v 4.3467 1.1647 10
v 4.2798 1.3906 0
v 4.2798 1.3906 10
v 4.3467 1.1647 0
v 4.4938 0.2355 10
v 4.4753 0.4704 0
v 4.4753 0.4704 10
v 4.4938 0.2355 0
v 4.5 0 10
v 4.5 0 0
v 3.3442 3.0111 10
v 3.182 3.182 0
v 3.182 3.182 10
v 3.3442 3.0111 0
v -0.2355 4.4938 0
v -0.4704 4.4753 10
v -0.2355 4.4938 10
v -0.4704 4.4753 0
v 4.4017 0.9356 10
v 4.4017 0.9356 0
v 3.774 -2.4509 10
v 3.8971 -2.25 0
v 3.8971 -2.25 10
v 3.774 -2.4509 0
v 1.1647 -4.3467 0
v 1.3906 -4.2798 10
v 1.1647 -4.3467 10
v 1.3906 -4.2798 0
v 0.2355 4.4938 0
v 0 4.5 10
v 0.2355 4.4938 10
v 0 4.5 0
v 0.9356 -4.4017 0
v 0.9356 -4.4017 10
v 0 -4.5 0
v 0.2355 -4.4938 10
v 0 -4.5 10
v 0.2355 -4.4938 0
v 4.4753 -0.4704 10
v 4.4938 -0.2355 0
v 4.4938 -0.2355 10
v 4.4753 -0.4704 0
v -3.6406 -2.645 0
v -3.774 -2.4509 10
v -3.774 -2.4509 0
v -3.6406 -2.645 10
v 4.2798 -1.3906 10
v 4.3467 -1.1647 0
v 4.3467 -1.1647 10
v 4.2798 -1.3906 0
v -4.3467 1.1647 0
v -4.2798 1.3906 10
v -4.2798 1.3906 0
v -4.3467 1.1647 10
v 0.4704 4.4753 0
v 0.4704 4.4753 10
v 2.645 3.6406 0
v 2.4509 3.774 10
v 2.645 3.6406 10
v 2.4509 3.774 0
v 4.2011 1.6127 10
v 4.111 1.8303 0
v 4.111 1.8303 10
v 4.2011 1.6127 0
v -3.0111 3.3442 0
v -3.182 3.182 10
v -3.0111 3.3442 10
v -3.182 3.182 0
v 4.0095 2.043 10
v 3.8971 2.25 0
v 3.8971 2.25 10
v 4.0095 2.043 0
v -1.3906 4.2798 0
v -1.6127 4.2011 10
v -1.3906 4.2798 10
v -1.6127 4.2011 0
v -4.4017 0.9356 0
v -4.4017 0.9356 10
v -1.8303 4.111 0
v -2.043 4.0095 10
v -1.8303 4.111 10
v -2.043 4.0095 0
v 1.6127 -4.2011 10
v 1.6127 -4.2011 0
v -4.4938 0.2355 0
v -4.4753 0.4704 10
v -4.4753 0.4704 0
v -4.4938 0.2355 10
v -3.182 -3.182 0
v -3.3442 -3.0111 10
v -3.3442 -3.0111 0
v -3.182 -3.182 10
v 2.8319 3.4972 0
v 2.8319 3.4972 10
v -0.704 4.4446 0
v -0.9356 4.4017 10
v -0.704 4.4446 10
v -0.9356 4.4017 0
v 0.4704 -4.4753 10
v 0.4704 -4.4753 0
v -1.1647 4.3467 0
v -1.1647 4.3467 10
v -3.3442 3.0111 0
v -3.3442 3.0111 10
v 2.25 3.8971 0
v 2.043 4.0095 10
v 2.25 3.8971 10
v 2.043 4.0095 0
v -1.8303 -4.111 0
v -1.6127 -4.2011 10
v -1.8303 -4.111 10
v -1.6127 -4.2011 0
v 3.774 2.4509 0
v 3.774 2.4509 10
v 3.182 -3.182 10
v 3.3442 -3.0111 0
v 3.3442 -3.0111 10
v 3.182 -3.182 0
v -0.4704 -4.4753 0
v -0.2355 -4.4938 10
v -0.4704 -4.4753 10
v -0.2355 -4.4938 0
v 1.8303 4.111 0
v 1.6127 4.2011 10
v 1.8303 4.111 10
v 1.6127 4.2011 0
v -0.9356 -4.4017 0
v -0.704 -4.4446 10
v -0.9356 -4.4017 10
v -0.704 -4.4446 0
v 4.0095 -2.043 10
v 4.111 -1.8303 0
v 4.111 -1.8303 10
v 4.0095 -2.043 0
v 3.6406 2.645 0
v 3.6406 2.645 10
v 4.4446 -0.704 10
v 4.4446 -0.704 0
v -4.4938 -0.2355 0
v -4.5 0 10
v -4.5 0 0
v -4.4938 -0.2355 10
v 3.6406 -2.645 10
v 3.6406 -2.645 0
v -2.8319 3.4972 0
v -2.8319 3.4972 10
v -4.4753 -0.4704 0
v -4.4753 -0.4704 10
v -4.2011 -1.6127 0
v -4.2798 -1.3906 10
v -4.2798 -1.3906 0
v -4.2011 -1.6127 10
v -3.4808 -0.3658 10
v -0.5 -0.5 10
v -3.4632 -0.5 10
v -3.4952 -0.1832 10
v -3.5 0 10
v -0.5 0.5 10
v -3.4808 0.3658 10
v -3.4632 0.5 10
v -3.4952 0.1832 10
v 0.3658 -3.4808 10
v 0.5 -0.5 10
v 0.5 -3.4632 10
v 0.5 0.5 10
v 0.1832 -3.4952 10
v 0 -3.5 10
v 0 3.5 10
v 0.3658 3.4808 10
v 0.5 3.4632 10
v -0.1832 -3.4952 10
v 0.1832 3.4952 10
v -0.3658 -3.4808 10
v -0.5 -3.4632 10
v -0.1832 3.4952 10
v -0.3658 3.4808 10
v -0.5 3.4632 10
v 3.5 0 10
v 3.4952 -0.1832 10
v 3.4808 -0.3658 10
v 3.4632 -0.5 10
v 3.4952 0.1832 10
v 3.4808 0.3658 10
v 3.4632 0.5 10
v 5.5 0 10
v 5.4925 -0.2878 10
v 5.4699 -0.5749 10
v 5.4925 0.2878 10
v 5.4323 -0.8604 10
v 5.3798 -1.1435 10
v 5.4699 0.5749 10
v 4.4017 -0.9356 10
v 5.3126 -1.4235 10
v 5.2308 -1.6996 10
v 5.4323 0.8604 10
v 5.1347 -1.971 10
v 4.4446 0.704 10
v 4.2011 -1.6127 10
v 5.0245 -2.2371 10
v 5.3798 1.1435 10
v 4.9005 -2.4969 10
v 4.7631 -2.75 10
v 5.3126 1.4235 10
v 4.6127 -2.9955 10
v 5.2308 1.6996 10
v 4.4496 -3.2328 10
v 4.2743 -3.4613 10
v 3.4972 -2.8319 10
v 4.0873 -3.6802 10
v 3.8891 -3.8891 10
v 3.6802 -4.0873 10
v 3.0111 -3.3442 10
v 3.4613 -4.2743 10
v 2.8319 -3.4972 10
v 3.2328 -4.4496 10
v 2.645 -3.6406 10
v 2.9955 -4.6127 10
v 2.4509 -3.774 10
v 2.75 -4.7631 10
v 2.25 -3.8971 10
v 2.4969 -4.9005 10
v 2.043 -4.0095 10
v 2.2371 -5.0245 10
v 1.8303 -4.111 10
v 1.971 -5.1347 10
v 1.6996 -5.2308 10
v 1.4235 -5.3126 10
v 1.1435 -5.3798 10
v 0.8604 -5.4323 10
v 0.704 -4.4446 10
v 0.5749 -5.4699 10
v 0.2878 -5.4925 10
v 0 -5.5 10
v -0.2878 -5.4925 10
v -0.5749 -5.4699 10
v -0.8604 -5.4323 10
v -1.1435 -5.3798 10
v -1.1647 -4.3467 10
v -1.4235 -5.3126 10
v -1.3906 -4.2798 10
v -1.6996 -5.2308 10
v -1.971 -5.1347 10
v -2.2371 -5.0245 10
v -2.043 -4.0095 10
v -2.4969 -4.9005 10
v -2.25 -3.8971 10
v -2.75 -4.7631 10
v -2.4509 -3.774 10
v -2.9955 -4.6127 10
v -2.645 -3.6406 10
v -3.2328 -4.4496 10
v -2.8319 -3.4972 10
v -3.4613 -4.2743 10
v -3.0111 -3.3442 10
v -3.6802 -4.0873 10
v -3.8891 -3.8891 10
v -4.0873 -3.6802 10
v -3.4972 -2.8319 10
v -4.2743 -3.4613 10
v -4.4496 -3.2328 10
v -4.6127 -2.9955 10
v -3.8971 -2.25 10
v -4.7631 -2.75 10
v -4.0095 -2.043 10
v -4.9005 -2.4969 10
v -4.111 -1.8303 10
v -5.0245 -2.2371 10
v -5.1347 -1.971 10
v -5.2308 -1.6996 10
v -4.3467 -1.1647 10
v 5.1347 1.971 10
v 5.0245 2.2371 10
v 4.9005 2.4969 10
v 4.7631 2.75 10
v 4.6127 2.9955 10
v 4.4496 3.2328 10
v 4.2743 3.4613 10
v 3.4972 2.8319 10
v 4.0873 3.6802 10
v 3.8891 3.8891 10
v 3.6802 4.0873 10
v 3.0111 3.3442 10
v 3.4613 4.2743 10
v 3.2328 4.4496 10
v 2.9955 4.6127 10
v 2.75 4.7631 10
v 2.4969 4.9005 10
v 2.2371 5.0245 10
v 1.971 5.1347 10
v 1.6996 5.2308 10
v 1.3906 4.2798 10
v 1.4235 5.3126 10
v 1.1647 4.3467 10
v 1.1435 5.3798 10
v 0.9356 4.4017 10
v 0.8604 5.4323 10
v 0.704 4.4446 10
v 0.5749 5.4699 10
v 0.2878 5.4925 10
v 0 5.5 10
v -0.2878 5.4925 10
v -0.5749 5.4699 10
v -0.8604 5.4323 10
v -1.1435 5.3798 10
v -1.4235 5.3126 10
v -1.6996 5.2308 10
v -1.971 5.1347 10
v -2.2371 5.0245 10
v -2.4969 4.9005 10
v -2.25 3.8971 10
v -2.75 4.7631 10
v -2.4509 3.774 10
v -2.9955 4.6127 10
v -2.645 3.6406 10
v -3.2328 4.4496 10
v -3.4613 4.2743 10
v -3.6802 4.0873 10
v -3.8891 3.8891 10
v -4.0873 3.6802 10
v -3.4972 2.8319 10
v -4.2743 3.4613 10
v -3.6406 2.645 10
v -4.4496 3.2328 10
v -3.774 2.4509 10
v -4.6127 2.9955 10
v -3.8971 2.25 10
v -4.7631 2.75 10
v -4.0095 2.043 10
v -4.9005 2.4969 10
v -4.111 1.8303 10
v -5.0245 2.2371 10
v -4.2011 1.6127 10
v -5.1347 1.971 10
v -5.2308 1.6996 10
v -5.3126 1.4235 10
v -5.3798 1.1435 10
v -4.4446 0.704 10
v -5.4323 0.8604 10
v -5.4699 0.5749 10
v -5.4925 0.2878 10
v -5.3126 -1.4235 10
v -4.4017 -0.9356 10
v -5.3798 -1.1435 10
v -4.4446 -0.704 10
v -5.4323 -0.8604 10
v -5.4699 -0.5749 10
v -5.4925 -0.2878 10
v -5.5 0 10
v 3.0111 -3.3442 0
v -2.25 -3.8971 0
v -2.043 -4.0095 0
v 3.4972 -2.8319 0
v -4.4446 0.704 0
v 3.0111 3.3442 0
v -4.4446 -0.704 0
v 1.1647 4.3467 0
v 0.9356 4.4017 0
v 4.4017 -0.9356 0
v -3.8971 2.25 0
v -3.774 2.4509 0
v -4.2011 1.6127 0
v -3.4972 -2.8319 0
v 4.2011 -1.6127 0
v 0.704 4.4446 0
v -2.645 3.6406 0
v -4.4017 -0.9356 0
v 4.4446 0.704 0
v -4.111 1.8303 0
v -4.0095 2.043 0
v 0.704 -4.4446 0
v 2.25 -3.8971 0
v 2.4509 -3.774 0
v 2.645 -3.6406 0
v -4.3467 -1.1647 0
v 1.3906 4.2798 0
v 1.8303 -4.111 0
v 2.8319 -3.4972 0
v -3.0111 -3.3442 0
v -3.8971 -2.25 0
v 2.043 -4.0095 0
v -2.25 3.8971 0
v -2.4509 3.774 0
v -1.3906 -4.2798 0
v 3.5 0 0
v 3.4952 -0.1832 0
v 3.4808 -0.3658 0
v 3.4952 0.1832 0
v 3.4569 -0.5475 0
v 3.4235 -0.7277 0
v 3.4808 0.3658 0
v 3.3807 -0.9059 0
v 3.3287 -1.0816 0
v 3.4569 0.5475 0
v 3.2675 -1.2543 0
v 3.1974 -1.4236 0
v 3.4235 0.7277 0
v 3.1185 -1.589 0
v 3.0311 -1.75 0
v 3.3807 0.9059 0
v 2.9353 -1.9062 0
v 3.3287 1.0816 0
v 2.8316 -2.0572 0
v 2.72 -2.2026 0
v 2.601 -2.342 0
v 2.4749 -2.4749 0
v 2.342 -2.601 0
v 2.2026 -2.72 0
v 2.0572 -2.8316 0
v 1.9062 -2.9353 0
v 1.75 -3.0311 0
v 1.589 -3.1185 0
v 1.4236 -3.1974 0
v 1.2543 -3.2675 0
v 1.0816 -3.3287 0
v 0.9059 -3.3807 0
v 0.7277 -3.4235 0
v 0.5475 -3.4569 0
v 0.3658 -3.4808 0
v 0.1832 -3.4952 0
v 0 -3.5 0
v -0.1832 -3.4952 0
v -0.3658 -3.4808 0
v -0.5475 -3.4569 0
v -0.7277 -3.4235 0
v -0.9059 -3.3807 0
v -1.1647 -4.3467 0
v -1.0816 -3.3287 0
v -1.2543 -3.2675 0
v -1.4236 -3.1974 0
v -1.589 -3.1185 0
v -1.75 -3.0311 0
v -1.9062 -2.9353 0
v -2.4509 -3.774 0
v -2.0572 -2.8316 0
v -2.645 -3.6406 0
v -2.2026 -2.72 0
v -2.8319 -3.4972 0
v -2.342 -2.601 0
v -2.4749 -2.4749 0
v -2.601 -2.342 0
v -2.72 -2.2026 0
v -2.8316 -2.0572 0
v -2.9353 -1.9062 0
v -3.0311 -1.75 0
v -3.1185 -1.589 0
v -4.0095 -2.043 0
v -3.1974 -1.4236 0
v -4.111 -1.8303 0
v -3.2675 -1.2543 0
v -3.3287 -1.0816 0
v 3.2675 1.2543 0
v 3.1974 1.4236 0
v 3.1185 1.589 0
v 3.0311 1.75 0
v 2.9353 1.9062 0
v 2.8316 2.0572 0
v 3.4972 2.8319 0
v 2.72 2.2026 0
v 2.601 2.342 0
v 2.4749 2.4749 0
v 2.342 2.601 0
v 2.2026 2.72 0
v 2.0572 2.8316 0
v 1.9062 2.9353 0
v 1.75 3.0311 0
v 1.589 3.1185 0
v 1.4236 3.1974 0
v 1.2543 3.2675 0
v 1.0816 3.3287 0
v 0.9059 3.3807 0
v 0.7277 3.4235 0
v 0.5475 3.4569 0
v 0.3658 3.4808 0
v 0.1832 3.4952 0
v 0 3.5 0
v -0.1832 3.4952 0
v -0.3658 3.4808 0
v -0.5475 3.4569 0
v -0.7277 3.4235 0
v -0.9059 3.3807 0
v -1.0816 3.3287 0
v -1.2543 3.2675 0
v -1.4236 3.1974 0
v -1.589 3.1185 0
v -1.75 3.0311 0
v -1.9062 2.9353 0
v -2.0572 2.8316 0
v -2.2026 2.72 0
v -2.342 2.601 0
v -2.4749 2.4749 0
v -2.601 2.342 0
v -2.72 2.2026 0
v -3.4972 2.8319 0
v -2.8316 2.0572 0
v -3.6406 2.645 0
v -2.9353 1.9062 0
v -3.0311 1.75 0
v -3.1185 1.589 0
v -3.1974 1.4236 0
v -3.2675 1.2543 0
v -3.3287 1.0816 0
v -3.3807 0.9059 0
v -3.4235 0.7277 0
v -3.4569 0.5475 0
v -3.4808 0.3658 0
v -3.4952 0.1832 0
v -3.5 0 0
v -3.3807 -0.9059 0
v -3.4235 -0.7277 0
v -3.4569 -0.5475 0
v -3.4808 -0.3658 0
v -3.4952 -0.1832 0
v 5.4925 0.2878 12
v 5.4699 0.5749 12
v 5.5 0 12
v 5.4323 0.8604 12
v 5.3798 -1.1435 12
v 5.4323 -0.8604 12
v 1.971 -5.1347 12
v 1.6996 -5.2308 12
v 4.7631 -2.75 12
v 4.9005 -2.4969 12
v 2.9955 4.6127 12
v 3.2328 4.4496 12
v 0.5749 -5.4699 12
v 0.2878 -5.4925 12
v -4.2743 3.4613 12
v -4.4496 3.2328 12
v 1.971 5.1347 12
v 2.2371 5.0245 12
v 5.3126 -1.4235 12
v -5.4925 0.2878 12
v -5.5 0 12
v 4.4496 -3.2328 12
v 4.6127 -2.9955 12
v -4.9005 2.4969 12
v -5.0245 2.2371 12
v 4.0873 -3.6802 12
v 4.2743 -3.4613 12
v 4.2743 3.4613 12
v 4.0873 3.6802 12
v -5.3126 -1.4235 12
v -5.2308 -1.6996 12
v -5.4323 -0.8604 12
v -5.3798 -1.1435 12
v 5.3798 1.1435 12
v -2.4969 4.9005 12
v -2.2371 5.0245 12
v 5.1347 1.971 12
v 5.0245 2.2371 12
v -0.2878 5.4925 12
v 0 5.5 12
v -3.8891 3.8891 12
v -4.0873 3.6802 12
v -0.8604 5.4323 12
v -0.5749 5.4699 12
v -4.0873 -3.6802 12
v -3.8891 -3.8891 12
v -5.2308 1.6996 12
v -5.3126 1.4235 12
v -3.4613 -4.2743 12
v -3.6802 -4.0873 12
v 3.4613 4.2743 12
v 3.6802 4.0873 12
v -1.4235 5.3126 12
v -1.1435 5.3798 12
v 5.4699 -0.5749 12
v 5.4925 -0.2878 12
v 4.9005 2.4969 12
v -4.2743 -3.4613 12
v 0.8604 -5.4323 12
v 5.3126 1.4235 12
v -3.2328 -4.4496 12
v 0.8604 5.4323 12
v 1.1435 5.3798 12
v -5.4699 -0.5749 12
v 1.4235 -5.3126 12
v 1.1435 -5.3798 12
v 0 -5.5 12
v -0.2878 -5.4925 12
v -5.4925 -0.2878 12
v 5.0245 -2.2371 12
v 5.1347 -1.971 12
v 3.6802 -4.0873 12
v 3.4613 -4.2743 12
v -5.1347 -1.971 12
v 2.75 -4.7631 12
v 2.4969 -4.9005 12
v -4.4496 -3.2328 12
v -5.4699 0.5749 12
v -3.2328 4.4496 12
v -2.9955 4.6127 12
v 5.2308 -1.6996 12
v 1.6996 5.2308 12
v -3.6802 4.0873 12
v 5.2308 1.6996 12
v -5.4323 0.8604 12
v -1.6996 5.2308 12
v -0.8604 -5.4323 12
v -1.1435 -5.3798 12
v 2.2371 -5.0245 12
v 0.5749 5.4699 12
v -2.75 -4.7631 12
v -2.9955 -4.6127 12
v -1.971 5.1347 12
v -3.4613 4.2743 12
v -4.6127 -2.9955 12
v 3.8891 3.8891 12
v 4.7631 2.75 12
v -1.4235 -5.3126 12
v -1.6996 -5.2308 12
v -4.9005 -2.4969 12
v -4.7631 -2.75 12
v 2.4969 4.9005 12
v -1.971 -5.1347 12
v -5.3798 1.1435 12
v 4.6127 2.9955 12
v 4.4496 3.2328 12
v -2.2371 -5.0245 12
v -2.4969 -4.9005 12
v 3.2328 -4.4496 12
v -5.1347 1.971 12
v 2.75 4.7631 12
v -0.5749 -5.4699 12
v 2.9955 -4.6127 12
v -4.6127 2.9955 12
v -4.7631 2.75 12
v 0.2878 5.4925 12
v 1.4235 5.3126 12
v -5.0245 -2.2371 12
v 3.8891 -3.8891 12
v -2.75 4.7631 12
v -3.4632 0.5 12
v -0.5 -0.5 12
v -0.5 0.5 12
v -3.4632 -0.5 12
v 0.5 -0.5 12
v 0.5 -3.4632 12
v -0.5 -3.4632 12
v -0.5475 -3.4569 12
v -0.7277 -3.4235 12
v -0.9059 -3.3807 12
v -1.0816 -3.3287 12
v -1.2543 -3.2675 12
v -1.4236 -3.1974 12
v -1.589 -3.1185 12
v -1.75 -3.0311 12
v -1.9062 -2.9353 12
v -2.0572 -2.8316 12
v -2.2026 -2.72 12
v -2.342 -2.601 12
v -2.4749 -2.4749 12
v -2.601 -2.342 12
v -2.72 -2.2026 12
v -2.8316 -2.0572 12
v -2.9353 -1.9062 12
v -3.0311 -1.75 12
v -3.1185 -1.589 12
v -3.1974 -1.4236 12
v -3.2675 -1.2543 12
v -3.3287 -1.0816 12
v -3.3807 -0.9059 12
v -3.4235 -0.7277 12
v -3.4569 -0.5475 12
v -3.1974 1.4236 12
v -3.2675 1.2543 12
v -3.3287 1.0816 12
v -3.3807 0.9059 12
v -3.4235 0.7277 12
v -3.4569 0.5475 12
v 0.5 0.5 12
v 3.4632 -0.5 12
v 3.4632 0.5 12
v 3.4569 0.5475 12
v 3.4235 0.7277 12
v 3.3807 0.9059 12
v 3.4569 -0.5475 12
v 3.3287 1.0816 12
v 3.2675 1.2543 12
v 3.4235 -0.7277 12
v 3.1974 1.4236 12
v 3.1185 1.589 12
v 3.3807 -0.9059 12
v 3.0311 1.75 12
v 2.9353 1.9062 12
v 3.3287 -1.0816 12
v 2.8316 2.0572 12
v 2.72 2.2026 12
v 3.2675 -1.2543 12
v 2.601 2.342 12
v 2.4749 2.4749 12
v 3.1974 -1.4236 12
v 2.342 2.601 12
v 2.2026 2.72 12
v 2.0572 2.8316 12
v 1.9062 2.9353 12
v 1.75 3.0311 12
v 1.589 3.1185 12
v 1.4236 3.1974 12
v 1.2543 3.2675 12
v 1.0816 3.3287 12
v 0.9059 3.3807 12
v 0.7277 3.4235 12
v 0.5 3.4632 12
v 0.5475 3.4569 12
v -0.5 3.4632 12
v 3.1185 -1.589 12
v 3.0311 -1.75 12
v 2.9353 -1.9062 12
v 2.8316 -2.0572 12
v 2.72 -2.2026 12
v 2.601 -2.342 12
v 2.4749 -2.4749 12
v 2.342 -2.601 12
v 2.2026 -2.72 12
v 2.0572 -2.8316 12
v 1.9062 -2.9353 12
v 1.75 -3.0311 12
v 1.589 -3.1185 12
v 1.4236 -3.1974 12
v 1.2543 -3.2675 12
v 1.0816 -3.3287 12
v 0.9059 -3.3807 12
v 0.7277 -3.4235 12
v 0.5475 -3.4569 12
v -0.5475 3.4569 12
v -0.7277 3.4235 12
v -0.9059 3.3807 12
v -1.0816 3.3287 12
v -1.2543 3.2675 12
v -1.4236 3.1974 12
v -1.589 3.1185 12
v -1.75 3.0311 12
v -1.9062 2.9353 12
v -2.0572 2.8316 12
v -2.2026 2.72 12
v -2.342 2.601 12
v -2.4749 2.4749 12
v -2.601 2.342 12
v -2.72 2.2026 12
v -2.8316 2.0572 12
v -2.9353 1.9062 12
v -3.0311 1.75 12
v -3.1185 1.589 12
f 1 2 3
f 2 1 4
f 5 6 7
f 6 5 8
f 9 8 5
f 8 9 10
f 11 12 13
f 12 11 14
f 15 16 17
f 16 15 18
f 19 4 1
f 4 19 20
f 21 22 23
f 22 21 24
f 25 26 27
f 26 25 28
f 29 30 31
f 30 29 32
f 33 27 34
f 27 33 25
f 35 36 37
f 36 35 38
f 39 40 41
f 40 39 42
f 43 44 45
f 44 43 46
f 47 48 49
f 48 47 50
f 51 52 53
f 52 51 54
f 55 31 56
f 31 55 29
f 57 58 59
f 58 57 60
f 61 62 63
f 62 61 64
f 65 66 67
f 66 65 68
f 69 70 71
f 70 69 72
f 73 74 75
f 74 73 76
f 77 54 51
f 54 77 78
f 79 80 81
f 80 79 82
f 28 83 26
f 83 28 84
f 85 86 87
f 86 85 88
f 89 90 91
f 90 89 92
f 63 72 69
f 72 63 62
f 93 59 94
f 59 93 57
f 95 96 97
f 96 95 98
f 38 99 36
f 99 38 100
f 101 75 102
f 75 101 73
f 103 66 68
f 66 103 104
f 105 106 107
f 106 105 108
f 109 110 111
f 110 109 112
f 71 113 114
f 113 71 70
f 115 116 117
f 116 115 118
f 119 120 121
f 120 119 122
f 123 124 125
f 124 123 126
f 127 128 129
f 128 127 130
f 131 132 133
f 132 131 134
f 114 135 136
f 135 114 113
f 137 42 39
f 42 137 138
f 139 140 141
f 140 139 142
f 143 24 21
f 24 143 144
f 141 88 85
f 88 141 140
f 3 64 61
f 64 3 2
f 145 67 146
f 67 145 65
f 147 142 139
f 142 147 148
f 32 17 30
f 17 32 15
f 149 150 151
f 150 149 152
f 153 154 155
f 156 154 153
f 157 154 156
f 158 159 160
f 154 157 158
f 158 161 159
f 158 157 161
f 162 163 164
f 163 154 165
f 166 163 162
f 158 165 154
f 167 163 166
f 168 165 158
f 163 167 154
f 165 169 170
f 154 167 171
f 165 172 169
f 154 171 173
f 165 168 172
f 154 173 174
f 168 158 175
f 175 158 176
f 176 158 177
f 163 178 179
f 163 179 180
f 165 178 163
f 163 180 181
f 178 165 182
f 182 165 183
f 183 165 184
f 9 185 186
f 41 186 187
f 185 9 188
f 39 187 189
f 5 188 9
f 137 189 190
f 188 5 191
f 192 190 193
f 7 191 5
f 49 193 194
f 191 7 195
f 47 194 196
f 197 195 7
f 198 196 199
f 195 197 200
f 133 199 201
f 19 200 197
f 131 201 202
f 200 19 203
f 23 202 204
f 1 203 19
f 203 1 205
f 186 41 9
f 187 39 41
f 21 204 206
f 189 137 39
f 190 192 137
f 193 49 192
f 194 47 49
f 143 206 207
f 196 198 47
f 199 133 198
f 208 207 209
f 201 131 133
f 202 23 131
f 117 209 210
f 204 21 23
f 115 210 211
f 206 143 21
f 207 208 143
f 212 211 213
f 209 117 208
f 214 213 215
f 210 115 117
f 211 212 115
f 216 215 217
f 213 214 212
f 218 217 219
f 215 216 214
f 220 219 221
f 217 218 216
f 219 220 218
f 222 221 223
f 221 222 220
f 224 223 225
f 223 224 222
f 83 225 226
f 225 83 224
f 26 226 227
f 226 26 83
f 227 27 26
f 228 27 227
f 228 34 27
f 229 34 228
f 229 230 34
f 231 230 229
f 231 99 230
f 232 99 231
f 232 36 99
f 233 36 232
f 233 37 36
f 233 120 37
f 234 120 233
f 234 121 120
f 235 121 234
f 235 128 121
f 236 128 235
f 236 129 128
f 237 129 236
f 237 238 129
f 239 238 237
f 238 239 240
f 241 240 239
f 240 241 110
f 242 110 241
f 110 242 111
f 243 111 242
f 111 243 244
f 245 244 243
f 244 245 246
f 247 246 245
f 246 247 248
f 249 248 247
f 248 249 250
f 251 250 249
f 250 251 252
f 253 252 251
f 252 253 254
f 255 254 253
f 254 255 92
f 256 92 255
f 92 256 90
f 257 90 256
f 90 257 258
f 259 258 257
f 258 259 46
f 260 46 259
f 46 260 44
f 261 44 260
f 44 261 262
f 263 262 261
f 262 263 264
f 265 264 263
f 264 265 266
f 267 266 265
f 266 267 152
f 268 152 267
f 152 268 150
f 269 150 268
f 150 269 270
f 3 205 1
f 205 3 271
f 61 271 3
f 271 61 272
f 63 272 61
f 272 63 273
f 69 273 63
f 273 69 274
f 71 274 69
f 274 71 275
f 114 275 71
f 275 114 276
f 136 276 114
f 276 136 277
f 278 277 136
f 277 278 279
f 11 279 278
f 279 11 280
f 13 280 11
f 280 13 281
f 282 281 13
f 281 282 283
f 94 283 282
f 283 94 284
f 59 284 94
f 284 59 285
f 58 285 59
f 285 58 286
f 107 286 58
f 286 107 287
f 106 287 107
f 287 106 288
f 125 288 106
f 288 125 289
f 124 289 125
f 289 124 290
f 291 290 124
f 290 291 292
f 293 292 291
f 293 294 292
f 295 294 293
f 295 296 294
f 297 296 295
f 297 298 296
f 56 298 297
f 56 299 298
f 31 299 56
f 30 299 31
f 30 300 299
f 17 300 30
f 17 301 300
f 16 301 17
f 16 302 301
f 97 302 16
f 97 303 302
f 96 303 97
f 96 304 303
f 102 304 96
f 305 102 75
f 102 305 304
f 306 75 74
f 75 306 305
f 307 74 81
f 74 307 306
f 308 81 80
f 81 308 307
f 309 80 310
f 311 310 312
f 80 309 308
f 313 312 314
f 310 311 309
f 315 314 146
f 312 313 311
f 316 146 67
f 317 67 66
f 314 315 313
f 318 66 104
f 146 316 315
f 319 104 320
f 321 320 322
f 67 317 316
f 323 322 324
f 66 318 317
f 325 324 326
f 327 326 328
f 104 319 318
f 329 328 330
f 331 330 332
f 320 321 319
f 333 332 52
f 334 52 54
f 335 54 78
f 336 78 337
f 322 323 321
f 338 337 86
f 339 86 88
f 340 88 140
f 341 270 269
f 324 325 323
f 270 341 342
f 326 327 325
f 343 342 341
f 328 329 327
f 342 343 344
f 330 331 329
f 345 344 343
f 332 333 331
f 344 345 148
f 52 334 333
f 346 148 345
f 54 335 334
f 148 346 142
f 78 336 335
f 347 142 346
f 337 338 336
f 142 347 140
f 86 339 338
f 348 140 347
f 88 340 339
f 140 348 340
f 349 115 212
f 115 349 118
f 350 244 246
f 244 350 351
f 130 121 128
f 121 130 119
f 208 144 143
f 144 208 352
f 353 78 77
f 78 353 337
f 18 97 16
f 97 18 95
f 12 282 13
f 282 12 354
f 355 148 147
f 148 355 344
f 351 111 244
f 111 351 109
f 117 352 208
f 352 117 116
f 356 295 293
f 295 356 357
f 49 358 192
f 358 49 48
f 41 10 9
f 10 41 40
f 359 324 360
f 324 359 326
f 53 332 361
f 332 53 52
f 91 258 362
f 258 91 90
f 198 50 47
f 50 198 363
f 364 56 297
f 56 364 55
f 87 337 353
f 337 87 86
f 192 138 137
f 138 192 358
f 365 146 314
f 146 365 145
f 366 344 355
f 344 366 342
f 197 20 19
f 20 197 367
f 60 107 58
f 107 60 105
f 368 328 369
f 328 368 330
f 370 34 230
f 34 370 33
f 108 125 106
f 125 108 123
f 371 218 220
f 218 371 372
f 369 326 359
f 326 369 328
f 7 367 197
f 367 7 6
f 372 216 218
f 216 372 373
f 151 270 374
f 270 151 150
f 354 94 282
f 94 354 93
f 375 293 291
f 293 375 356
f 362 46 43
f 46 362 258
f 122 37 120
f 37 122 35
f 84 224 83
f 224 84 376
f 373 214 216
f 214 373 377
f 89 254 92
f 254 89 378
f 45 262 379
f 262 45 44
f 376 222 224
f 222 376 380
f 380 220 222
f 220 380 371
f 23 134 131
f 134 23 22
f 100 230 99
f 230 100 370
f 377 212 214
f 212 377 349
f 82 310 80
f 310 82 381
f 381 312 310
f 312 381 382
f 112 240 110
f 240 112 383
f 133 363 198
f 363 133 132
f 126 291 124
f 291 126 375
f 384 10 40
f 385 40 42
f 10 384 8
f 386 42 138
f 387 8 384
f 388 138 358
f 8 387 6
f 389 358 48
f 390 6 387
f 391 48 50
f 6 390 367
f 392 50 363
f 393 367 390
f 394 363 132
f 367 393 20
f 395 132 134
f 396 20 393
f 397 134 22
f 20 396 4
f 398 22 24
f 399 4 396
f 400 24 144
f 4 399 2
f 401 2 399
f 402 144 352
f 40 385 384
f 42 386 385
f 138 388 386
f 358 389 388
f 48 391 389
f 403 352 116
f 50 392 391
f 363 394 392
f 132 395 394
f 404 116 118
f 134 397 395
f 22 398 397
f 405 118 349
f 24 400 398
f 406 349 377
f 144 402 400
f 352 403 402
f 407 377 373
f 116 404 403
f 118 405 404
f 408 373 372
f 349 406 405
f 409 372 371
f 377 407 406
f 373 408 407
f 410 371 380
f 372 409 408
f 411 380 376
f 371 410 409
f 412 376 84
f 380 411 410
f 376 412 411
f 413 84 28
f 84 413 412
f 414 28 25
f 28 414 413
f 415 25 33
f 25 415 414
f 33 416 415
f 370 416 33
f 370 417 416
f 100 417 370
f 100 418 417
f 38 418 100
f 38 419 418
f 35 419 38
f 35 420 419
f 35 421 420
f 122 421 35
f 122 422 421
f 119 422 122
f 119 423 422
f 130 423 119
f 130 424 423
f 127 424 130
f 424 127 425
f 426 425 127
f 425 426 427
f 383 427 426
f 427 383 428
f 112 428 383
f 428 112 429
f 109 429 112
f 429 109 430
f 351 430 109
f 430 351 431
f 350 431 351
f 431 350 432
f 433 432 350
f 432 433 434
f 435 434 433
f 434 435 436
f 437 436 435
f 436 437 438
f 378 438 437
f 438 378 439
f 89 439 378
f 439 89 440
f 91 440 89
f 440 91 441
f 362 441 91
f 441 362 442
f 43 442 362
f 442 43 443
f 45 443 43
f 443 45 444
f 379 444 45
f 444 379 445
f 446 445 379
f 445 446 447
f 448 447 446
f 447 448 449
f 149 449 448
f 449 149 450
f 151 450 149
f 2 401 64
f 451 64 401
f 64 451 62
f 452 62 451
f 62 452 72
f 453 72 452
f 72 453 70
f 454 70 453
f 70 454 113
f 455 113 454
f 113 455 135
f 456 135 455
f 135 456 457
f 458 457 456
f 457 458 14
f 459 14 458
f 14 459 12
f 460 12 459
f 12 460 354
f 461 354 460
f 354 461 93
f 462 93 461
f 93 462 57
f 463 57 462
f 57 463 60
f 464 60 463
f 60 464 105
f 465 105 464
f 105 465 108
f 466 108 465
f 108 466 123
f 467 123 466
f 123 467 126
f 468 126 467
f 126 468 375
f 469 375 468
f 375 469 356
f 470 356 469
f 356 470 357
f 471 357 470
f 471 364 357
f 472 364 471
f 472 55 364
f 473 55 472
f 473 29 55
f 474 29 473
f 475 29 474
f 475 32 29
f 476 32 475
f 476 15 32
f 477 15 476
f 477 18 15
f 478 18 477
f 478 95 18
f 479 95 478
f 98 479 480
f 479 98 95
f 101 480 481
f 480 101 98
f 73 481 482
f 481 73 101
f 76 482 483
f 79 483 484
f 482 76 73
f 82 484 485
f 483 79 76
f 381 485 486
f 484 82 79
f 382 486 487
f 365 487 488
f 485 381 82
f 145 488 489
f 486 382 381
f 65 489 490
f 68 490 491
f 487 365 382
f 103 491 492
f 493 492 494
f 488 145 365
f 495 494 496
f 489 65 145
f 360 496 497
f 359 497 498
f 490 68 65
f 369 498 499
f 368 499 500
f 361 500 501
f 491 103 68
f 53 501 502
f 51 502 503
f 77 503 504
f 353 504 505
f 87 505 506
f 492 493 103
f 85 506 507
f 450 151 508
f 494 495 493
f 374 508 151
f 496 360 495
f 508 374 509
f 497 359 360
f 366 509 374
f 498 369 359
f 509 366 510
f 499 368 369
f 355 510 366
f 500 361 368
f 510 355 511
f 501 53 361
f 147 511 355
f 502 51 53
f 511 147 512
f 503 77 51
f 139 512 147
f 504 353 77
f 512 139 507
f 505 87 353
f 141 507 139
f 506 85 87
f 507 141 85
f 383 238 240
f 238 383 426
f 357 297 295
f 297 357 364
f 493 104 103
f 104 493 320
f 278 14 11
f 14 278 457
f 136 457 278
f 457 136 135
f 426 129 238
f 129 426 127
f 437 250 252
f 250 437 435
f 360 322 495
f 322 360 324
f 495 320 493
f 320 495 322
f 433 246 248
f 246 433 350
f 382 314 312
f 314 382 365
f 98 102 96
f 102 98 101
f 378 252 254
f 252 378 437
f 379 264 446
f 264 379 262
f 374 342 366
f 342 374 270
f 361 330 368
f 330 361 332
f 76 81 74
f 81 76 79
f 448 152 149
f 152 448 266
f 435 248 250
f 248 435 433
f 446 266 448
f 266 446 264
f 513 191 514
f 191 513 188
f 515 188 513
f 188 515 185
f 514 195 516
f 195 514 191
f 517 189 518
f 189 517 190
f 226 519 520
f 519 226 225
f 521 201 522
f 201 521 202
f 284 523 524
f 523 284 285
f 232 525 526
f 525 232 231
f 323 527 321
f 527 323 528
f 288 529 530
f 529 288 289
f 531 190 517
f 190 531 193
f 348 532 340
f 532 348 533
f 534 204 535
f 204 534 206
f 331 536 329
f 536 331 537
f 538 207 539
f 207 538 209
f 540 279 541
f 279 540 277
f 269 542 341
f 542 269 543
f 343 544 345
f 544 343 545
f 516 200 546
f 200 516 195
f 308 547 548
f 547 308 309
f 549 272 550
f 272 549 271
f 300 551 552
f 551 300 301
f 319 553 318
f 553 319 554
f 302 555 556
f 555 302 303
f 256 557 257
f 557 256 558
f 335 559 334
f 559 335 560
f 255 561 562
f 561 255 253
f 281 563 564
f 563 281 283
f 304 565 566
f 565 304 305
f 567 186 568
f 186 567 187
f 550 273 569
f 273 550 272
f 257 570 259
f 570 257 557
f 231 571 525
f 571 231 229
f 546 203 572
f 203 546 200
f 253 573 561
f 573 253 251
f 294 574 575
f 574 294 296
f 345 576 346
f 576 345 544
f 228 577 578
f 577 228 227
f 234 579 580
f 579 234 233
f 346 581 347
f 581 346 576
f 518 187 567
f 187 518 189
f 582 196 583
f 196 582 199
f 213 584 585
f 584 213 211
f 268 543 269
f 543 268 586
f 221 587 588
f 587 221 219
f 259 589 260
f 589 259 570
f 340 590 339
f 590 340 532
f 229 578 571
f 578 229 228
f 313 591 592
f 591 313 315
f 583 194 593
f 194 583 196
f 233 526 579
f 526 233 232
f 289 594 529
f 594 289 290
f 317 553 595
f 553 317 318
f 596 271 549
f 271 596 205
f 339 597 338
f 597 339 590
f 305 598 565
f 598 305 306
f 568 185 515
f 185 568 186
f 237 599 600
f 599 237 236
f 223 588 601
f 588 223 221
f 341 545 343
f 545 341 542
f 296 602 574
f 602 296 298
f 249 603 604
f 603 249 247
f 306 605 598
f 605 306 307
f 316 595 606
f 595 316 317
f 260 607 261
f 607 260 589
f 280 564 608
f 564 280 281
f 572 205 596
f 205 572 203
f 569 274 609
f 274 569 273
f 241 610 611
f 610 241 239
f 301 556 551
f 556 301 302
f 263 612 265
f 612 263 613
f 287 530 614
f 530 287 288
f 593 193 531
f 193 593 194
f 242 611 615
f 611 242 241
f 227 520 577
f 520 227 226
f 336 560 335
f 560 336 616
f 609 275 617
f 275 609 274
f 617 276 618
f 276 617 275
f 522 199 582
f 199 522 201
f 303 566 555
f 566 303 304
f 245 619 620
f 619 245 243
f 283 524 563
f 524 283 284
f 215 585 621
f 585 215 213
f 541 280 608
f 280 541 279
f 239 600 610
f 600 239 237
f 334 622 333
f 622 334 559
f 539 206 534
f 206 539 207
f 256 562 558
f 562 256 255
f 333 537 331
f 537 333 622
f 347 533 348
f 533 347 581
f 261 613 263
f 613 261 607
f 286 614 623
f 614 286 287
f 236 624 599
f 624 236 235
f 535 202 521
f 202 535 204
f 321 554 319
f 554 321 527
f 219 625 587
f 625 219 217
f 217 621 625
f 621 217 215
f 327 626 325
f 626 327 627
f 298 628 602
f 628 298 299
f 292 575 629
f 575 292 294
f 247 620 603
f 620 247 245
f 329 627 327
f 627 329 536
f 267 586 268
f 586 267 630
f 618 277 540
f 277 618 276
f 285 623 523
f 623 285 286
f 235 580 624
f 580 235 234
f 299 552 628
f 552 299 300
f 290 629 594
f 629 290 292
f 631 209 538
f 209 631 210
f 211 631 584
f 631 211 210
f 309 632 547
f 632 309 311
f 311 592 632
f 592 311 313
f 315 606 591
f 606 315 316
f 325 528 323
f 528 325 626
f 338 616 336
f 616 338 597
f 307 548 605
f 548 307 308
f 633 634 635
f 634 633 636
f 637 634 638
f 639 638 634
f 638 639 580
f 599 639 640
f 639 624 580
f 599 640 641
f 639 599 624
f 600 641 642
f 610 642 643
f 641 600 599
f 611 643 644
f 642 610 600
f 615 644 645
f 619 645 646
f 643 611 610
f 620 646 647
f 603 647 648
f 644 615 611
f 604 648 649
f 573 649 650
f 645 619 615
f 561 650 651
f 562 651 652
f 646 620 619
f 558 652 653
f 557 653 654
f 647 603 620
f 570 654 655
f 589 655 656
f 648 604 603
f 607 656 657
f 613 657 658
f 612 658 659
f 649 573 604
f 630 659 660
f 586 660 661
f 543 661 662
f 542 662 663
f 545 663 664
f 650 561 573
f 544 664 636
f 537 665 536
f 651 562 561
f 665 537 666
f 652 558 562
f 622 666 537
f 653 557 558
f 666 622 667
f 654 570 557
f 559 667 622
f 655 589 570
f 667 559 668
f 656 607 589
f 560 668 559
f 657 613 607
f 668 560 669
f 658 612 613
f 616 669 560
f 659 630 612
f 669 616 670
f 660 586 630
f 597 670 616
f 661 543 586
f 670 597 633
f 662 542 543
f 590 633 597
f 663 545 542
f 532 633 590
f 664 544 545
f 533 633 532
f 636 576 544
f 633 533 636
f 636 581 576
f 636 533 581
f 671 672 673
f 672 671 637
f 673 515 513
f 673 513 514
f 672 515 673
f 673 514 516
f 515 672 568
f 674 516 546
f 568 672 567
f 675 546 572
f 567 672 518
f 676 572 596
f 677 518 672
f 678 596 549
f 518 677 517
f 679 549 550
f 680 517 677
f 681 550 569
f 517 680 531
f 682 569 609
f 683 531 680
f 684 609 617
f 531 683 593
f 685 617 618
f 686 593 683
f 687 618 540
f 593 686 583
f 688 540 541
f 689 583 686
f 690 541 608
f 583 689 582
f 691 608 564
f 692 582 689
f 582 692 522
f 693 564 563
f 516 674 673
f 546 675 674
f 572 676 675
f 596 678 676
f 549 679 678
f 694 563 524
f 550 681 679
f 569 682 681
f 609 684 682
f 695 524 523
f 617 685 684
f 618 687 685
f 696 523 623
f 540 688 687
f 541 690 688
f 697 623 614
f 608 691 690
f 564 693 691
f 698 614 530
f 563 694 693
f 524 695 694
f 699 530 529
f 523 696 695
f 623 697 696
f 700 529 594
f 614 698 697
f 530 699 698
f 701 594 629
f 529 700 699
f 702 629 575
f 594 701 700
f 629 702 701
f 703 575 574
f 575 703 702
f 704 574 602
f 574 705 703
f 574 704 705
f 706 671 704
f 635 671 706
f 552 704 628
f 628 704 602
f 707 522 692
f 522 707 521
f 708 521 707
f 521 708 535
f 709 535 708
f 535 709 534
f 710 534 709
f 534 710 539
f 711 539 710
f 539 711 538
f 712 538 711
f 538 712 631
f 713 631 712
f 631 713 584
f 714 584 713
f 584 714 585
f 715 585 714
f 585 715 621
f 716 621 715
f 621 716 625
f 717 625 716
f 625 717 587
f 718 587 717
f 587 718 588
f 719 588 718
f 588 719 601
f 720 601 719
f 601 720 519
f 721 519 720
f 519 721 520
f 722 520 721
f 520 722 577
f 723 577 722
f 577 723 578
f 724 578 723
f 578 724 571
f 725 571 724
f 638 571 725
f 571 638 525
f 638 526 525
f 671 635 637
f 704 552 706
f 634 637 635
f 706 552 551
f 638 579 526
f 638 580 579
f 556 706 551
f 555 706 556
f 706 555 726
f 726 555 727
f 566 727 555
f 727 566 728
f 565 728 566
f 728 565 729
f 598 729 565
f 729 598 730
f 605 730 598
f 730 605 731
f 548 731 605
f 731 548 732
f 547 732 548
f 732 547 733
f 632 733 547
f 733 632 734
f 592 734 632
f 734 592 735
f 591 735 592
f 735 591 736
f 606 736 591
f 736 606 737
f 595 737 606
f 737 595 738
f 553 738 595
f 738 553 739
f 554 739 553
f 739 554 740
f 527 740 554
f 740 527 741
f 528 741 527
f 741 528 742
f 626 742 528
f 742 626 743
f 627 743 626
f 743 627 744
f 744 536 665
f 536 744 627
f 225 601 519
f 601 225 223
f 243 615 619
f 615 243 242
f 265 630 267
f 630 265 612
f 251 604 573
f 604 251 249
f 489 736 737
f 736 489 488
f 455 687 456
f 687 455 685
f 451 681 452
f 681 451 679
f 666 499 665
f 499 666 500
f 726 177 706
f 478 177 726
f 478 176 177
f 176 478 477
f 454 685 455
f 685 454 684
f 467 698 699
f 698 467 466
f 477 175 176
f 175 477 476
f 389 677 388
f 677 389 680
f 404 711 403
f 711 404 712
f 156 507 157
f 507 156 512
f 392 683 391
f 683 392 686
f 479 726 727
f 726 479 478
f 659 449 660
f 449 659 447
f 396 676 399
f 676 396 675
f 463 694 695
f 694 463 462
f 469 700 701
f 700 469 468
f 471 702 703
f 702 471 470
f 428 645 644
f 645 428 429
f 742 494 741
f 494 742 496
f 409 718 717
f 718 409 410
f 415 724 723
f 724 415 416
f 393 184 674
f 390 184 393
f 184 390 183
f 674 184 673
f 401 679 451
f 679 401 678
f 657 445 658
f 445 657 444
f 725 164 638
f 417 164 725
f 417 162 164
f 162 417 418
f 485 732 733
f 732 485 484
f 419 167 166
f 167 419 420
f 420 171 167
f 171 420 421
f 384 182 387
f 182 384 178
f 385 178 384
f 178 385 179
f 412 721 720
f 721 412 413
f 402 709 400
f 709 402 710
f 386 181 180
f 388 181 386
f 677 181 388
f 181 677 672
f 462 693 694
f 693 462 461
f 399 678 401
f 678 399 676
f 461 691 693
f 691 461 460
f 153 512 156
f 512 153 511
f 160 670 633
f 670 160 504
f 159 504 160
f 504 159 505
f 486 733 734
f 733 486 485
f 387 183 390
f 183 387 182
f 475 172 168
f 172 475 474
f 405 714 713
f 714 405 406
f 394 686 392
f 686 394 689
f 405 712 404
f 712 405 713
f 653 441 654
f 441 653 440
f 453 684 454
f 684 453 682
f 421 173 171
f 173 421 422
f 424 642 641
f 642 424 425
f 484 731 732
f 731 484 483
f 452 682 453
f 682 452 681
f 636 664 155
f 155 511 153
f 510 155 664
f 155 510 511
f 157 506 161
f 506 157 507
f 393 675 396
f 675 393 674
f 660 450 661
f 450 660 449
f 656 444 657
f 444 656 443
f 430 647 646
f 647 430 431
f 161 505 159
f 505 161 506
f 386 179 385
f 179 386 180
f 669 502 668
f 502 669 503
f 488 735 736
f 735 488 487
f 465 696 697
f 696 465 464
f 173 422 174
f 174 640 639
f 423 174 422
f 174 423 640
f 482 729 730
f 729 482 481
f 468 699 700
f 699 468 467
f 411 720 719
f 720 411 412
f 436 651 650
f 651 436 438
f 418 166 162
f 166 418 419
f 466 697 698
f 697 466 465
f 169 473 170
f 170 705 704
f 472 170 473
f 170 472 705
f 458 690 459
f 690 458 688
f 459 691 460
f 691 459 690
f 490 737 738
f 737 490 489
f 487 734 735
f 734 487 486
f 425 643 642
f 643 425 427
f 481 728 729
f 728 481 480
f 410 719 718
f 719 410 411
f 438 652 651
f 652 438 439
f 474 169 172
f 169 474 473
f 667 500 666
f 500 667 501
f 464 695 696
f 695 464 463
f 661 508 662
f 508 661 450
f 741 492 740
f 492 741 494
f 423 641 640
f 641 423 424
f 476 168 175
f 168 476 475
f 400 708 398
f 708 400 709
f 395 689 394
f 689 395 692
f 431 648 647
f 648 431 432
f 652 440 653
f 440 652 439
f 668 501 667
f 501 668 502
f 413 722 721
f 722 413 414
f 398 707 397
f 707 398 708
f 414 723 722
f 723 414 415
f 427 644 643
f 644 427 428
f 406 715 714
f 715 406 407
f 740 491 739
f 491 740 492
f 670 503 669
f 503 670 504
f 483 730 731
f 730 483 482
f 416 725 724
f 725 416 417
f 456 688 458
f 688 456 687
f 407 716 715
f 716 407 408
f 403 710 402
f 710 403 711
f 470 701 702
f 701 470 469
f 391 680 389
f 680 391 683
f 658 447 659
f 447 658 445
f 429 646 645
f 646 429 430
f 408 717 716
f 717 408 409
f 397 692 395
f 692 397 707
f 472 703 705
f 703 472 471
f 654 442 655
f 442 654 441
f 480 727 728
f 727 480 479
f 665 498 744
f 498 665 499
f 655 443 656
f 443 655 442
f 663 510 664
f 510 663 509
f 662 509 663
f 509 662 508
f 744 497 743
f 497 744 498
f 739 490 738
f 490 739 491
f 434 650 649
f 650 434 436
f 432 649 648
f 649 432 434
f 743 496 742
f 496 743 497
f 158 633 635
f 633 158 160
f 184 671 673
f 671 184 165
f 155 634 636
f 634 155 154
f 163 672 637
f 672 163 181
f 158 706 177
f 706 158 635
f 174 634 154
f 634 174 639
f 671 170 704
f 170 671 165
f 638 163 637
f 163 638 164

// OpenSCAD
// Trou d'aération pour fenêtre
// paramètre pour lisser le cylindre 
$fn=120;

// cylindre de base
d1 = 9;
h1 = 10;

//cylindre haut
d2 = 11;
h2 = 2;

epaisseur = 1;   //épaisseur de la paroi en mm
eps = 0.01; // petit décalage pour éviter les problèmes de boolean

epaisseur_croix = 1; // épaisseur des rectangles de la croix


union() {
    difference() {
    
            union() {
                // Cylindre bas
                cylinder(h = h1, d = d1, center = false);

                // Cylindre haut d2
                translate([0, 0, h1])
                    cylinder(h = h2, d = d2, center = false);
            }

            // Perçage central
            translate([0, 0, -eps])
                cylinder(h = h1 + h2 + 2*eps, d = d1 - 2*epaisseur, center = false);
      }
     // 1er rectangle traversant le diamètre du cylindre d2
    translate([0, 0, h1 + h2/2])
        cube([d2-epaisseur, epaisseur_croix, h2], center = true);

    // 2e rectangle à 90°
    translate([0, 0, h1 + h2/2])
        rotate([0, 0, 90])
            cube([d2-epaisseur, epaisseur_croix, h2], center = true);
}
